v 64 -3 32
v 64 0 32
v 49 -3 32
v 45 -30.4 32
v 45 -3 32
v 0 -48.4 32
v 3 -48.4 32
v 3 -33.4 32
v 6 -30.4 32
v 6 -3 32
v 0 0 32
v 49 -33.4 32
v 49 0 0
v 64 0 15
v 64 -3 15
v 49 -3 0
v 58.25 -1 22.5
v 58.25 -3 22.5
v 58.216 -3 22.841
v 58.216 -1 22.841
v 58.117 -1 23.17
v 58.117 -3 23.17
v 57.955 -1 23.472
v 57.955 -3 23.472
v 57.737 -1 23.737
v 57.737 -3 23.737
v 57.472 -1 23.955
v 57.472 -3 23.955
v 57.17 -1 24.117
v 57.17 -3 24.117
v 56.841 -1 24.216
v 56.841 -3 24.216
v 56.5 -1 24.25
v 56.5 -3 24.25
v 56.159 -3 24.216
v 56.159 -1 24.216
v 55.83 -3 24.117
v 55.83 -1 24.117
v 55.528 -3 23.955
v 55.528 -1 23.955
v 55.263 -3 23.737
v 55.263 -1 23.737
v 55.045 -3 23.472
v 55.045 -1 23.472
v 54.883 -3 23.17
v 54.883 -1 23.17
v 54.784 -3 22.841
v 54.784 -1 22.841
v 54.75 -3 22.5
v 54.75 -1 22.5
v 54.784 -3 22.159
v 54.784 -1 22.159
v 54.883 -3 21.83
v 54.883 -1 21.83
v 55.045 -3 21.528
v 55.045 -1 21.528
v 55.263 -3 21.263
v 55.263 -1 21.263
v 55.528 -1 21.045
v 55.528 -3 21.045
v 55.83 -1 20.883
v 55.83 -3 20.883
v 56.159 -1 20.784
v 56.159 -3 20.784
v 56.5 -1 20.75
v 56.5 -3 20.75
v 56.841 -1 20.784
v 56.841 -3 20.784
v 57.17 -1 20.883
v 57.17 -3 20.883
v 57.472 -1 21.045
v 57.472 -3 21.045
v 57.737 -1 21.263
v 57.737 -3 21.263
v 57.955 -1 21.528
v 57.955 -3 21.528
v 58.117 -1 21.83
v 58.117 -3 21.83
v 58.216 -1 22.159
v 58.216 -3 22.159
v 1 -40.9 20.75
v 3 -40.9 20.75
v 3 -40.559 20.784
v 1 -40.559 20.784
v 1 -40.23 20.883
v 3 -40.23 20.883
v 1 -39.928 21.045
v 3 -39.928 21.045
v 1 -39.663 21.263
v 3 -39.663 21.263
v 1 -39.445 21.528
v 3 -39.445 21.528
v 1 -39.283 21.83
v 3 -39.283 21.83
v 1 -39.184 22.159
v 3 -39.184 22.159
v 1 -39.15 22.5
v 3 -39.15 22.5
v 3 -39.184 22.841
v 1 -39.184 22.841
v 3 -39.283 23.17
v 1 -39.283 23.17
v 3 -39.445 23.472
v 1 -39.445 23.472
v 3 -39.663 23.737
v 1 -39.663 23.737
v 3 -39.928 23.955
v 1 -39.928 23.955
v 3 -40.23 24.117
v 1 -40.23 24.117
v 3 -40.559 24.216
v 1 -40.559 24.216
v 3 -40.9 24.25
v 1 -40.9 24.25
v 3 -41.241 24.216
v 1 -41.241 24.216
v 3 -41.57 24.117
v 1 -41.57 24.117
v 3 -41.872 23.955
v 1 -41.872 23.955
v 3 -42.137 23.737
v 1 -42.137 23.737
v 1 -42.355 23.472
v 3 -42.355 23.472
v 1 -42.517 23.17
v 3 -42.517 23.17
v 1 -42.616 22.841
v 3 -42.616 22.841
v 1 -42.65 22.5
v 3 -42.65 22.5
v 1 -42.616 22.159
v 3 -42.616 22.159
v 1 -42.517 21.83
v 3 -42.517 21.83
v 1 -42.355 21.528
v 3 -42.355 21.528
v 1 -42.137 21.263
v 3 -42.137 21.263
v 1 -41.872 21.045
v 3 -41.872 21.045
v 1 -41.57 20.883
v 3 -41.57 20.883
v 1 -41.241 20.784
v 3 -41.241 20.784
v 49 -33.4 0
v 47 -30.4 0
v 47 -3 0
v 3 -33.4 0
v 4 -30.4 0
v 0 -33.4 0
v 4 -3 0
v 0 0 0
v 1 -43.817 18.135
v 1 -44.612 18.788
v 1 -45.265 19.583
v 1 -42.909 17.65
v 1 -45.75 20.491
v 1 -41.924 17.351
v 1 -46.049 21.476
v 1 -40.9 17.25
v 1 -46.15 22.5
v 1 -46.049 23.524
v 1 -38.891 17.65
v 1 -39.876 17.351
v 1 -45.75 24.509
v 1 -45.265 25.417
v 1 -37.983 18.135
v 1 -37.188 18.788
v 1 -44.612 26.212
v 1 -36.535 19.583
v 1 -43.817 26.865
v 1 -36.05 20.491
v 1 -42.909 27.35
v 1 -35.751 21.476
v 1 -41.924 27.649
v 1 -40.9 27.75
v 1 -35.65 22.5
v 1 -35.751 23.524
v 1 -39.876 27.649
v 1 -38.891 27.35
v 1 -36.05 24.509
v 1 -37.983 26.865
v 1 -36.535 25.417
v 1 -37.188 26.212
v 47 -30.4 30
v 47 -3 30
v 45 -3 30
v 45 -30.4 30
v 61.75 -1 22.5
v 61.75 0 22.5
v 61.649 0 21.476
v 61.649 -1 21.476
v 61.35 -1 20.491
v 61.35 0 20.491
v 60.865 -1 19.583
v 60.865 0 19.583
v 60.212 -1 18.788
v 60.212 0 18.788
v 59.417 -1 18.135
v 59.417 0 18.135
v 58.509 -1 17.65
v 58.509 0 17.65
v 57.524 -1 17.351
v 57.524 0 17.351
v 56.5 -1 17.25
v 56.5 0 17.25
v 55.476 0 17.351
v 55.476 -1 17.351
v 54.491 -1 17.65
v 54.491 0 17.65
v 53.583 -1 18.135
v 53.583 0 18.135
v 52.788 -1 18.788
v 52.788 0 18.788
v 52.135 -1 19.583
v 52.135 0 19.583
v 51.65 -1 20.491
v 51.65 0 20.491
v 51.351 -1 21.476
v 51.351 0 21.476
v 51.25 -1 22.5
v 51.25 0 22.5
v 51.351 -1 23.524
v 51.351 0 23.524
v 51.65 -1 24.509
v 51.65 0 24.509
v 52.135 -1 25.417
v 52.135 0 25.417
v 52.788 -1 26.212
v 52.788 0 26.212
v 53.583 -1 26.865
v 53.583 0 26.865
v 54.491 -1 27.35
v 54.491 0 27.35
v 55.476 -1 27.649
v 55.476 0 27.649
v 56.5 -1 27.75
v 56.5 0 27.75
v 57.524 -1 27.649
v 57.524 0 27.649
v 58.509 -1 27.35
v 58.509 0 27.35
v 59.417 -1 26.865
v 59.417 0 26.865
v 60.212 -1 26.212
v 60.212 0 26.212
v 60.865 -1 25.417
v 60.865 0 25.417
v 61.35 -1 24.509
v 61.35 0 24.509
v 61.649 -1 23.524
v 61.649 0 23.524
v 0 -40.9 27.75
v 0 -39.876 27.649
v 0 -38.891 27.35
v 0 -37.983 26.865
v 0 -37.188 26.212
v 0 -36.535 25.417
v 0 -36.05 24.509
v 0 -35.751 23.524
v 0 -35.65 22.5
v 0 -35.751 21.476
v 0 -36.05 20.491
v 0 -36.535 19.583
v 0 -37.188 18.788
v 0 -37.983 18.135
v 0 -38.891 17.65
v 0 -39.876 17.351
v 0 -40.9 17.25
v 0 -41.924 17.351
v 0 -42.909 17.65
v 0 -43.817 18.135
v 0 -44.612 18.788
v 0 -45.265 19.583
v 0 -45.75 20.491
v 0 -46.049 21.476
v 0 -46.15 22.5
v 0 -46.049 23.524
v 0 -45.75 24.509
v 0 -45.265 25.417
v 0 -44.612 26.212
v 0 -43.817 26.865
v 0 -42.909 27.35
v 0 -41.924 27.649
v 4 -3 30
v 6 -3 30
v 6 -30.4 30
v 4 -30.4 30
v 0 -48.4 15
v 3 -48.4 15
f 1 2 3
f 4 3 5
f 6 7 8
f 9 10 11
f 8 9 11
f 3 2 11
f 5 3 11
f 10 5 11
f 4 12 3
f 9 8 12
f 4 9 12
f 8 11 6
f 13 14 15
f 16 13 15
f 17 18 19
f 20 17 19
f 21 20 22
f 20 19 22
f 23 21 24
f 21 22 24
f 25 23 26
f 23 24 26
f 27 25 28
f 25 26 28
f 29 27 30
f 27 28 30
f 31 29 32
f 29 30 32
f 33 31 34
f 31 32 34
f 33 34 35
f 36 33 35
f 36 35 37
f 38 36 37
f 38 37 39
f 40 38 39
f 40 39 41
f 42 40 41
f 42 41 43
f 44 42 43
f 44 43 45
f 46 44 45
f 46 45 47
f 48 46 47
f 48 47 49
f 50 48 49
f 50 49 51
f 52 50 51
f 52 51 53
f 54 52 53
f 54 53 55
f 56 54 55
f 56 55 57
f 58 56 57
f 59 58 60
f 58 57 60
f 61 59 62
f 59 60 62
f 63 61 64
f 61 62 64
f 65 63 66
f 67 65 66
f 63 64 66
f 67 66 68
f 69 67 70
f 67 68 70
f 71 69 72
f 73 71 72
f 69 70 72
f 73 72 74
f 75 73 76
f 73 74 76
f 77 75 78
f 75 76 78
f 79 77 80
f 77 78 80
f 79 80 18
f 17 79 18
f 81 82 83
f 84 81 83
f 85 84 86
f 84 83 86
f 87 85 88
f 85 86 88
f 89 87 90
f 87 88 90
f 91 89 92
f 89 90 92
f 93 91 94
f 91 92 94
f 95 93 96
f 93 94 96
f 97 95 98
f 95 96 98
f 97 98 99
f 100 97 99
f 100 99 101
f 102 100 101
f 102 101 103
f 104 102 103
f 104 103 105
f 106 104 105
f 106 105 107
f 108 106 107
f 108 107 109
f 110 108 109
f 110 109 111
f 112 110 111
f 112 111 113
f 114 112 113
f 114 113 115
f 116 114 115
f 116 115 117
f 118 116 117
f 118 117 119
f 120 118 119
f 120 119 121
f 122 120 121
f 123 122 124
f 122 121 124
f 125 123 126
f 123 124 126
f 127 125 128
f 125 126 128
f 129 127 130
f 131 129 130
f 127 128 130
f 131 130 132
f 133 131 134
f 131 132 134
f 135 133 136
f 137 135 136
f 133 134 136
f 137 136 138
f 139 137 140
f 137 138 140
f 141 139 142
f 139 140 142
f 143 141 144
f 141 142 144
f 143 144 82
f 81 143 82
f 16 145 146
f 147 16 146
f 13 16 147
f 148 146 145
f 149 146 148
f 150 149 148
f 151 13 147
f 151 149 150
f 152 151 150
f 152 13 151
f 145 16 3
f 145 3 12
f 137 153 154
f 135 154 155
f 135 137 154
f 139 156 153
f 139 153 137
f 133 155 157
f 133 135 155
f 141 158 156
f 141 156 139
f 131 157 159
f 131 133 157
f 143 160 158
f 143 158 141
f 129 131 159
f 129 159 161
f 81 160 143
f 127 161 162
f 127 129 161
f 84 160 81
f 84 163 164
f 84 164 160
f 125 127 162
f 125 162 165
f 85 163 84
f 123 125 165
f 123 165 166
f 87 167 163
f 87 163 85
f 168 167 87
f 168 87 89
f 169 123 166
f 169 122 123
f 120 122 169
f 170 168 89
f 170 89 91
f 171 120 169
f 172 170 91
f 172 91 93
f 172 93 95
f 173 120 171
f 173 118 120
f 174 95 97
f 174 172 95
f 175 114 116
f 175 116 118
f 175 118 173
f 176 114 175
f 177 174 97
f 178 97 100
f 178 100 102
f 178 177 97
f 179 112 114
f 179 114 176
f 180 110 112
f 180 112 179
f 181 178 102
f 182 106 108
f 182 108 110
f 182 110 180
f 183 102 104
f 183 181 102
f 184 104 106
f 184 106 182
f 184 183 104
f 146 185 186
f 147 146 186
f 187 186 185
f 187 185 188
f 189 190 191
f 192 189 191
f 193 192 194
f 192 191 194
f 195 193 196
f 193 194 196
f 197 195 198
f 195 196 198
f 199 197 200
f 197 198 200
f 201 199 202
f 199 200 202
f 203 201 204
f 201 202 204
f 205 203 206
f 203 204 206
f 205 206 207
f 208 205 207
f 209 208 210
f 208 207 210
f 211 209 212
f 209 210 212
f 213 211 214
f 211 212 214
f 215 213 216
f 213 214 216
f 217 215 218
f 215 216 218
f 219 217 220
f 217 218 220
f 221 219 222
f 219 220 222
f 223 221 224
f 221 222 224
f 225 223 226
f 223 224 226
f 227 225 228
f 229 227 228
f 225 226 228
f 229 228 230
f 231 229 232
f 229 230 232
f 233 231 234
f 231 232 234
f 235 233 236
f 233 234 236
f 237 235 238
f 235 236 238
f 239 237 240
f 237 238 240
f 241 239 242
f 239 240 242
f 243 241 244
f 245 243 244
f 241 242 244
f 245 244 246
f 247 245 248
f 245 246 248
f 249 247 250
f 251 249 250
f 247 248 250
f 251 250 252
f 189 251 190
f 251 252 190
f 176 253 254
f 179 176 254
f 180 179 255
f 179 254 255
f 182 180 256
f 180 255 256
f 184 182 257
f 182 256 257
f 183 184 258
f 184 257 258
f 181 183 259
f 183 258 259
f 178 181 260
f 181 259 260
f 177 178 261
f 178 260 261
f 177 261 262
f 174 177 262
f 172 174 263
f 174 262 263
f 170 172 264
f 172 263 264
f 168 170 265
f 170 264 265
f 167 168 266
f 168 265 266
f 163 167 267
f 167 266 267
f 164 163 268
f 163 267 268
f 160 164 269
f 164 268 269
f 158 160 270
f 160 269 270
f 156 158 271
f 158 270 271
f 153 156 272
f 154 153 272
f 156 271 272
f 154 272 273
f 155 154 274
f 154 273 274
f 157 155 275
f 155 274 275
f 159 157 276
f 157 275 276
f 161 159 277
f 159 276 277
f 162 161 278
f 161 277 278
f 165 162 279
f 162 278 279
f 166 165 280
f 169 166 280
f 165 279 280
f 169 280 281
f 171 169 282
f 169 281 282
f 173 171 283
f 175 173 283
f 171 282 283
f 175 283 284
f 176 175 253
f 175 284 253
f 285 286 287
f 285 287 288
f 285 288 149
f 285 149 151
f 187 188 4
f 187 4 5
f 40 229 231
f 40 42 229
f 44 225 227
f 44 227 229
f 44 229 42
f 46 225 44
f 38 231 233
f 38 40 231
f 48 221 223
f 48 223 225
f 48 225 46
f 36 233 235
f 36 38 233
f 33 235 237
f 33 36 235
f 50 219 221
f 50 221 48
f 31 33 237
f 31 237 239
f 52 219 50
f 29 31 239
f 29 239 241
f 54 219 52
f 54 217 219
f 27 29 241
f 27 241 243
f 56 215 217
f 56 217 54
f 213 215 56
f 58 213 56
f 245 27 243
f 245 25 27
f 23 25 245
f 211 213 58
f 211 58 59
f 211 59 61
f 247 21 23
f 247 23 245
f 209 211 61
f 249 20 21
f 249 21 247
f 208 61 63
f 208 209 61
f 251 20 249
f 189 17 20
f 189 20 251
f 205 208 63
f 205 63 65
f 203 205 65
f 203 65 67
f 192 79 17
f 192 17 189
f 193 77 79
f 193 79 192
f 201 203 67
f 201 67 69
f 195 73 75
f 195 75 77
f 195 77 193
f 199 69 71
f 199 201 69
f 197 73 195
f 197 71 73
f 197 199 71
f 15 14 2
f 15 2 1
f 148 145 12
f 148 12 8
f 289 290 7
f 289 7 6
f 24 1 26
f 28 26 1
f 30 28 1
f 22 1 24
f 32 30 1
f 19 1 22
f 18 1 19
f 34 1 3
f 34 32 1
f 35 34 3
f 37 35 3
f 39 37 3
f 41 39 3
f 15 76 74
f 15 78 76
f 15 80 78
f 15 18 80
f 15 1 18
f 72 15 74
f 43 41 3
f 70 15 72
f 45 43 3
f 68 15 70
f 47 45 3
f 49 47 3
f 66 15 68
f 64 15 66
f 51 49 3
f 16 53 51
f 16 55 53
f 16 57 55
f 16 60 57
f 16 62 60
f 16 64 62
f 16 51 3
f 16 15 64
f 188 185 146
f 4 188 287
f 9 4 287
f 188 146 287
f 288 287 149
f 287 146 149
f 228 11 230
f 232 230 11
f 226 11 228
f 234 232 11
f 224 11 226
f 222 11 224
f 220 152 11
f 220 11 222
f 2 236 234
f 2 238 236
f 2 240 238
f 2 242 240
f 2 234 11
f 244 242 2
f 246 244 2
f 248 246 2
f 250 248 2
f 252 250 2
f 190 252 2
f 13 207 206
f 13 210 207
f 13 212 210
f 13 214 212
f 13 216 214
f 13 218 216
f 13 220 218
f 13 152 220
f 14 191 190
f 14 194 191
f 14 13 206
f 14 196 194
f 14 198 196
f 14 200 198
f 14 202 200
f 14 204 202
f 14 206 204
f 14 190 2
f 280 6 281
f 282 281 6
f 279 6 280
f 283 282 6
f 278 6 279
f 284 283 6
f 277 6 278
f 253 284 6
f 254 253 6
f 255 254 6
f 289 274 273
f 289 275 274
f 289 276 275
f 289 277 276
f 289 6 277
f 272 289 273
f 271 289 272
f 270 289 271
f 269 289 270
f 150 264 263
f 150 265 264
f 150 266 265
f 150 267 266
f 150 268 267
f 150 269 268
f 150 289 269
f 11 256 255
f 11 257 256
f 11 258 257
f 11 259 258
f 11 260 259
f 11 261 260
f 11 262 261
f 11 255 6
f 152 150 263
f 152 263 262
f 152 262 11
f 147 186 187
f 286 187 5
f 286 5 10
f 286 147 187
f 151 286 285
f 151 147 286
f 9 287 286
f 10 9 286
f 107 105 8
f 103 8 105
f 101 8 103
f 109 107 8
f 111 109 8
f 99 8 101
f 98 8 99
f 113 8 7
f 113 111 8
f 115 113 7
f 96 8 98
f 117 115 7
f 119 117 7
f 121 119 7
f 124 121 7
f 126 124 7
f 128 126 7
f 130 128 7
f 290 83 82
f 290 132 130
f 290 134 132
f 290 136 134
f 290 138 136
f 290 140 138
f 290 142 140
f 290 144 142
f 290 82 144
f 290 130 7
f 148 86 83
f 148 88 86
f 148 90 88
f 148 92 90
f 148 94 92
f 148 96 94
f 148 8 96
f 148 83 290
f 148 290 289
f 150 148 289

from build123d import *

# Parameters (mm, degrees)
ESBO_O1_W                = 39
ESBO_O1_H                = 27.4
RESSALTO_EXTRUS_O1_DEPTH = 32
ESBO_O2_W                = 43
ESBO_O2_H                = 27.4
CORTE_EXTRUS_O1_DEPTH    = 30
ESBO_O3_R                = 1.75
CORTE_EXTRUS_O2_DEPTH    = 6
ESBO_O4_R                = 1.75
CORTE_EXTRUS_O3_DEPTH    = 6
CHANFRO1_SIZE            = 15
ESBO_O5_R                = 5.25
CORTE_EXTRUS_O4_DEPTH    = 1
ESBO_O6_R                = 5.25
CORTE_EXTRUS_O5_DEPTH    = 1


with BuildPart() as part:
    # Esboço1 → Ressalto-extrusão1 (new body)
    with BuildSketch(Plane.XY):
        Polygon((0, 0), (64, 0), (64, -3), (49, -3), (49, -33.4), (3, -33.4), (3, -48.4), (0, -48.4), align=None)
        with Locations((25.5, -16.7)):
            Rectangle(ESBO_O1_W, ESBO_O1_H, mode=Mode.SUBTRACT)
    extrude(amount=RESSALTO_EXTRUS_O1_DEPTH)

    # Esboço2 → Corte-extrusão1 (cut)
    with BuildSketch(Plane(origin=(0, 0, 0), x_dir=(-1, 0, 0), z_dir=(0, 0, -1))):
        with Locations((-25.5, -16.7)):
            Rectangle(ESBO_O2_W, ESBO_O2_H)
    extrude(amount=-CORTE_EXTRUS_O1_DEPTH, mode=Mode.SUBTRACT)

    # Esboço3 → Corte-extrusão2 (cut)
    with BuildSketch(Plane.XZ.offset(3)):
        with Locations((56.5, 22.5)):
            Circle(ESBO_O3_R)
    extrude(amount=-CORTE_EXTRUS_O2_DEPTH, mode=Mode.SUBTRACT)

    # Esboço4 → Corte-extrusão3 (cut)
    with BuildSketch(Plane(origin=(3, 0, 0), x_dir=(0, 0, -1), z_dir=(1, 0, 0))):
        with Locations((-22.5, -40.9)):
            Circle(ESBO_O4_R)
    extrude(amount=-CORTE_EXTRUS_O3_DEPTH, mode=Mode.SUBTRACT)

    # Chanfro1
    chanfro1_edges = [part.edges().sort_by_distance(p)[0] for p in [
        (1.5, -48.4, 0),
        (64, -1.5, 0),
    ]]
    chamfer(chanfro1_edges, length=CHANFRO1_SIZE)

    # Esboço5 → Corte-extrusão4 (cut)
    with BuildSketch(Plane(origin=(0, 0, 0), x_dir=(1, 0, 0), z_dir=(0, 1, 0))):
        with Locations((56.5, -22.5)):
            Circle(ESBO_O5_R)
    extrude(amount=-CORTE_EXTRUS_O4_DEPTH, mode=Mode.SUBTRACT)

    # Esboço6 → Corte-extrusão5 (cut)
    with BuildSketch(Plane.ZY):
        with Locations((22.5, -40.9)):
            Circle(ESBO_O6_R)
    extrude(amount=-CORTE_EXTRUS_O5_DEPTH, mode=Mode.SUBTRACT)


solid = part.part
